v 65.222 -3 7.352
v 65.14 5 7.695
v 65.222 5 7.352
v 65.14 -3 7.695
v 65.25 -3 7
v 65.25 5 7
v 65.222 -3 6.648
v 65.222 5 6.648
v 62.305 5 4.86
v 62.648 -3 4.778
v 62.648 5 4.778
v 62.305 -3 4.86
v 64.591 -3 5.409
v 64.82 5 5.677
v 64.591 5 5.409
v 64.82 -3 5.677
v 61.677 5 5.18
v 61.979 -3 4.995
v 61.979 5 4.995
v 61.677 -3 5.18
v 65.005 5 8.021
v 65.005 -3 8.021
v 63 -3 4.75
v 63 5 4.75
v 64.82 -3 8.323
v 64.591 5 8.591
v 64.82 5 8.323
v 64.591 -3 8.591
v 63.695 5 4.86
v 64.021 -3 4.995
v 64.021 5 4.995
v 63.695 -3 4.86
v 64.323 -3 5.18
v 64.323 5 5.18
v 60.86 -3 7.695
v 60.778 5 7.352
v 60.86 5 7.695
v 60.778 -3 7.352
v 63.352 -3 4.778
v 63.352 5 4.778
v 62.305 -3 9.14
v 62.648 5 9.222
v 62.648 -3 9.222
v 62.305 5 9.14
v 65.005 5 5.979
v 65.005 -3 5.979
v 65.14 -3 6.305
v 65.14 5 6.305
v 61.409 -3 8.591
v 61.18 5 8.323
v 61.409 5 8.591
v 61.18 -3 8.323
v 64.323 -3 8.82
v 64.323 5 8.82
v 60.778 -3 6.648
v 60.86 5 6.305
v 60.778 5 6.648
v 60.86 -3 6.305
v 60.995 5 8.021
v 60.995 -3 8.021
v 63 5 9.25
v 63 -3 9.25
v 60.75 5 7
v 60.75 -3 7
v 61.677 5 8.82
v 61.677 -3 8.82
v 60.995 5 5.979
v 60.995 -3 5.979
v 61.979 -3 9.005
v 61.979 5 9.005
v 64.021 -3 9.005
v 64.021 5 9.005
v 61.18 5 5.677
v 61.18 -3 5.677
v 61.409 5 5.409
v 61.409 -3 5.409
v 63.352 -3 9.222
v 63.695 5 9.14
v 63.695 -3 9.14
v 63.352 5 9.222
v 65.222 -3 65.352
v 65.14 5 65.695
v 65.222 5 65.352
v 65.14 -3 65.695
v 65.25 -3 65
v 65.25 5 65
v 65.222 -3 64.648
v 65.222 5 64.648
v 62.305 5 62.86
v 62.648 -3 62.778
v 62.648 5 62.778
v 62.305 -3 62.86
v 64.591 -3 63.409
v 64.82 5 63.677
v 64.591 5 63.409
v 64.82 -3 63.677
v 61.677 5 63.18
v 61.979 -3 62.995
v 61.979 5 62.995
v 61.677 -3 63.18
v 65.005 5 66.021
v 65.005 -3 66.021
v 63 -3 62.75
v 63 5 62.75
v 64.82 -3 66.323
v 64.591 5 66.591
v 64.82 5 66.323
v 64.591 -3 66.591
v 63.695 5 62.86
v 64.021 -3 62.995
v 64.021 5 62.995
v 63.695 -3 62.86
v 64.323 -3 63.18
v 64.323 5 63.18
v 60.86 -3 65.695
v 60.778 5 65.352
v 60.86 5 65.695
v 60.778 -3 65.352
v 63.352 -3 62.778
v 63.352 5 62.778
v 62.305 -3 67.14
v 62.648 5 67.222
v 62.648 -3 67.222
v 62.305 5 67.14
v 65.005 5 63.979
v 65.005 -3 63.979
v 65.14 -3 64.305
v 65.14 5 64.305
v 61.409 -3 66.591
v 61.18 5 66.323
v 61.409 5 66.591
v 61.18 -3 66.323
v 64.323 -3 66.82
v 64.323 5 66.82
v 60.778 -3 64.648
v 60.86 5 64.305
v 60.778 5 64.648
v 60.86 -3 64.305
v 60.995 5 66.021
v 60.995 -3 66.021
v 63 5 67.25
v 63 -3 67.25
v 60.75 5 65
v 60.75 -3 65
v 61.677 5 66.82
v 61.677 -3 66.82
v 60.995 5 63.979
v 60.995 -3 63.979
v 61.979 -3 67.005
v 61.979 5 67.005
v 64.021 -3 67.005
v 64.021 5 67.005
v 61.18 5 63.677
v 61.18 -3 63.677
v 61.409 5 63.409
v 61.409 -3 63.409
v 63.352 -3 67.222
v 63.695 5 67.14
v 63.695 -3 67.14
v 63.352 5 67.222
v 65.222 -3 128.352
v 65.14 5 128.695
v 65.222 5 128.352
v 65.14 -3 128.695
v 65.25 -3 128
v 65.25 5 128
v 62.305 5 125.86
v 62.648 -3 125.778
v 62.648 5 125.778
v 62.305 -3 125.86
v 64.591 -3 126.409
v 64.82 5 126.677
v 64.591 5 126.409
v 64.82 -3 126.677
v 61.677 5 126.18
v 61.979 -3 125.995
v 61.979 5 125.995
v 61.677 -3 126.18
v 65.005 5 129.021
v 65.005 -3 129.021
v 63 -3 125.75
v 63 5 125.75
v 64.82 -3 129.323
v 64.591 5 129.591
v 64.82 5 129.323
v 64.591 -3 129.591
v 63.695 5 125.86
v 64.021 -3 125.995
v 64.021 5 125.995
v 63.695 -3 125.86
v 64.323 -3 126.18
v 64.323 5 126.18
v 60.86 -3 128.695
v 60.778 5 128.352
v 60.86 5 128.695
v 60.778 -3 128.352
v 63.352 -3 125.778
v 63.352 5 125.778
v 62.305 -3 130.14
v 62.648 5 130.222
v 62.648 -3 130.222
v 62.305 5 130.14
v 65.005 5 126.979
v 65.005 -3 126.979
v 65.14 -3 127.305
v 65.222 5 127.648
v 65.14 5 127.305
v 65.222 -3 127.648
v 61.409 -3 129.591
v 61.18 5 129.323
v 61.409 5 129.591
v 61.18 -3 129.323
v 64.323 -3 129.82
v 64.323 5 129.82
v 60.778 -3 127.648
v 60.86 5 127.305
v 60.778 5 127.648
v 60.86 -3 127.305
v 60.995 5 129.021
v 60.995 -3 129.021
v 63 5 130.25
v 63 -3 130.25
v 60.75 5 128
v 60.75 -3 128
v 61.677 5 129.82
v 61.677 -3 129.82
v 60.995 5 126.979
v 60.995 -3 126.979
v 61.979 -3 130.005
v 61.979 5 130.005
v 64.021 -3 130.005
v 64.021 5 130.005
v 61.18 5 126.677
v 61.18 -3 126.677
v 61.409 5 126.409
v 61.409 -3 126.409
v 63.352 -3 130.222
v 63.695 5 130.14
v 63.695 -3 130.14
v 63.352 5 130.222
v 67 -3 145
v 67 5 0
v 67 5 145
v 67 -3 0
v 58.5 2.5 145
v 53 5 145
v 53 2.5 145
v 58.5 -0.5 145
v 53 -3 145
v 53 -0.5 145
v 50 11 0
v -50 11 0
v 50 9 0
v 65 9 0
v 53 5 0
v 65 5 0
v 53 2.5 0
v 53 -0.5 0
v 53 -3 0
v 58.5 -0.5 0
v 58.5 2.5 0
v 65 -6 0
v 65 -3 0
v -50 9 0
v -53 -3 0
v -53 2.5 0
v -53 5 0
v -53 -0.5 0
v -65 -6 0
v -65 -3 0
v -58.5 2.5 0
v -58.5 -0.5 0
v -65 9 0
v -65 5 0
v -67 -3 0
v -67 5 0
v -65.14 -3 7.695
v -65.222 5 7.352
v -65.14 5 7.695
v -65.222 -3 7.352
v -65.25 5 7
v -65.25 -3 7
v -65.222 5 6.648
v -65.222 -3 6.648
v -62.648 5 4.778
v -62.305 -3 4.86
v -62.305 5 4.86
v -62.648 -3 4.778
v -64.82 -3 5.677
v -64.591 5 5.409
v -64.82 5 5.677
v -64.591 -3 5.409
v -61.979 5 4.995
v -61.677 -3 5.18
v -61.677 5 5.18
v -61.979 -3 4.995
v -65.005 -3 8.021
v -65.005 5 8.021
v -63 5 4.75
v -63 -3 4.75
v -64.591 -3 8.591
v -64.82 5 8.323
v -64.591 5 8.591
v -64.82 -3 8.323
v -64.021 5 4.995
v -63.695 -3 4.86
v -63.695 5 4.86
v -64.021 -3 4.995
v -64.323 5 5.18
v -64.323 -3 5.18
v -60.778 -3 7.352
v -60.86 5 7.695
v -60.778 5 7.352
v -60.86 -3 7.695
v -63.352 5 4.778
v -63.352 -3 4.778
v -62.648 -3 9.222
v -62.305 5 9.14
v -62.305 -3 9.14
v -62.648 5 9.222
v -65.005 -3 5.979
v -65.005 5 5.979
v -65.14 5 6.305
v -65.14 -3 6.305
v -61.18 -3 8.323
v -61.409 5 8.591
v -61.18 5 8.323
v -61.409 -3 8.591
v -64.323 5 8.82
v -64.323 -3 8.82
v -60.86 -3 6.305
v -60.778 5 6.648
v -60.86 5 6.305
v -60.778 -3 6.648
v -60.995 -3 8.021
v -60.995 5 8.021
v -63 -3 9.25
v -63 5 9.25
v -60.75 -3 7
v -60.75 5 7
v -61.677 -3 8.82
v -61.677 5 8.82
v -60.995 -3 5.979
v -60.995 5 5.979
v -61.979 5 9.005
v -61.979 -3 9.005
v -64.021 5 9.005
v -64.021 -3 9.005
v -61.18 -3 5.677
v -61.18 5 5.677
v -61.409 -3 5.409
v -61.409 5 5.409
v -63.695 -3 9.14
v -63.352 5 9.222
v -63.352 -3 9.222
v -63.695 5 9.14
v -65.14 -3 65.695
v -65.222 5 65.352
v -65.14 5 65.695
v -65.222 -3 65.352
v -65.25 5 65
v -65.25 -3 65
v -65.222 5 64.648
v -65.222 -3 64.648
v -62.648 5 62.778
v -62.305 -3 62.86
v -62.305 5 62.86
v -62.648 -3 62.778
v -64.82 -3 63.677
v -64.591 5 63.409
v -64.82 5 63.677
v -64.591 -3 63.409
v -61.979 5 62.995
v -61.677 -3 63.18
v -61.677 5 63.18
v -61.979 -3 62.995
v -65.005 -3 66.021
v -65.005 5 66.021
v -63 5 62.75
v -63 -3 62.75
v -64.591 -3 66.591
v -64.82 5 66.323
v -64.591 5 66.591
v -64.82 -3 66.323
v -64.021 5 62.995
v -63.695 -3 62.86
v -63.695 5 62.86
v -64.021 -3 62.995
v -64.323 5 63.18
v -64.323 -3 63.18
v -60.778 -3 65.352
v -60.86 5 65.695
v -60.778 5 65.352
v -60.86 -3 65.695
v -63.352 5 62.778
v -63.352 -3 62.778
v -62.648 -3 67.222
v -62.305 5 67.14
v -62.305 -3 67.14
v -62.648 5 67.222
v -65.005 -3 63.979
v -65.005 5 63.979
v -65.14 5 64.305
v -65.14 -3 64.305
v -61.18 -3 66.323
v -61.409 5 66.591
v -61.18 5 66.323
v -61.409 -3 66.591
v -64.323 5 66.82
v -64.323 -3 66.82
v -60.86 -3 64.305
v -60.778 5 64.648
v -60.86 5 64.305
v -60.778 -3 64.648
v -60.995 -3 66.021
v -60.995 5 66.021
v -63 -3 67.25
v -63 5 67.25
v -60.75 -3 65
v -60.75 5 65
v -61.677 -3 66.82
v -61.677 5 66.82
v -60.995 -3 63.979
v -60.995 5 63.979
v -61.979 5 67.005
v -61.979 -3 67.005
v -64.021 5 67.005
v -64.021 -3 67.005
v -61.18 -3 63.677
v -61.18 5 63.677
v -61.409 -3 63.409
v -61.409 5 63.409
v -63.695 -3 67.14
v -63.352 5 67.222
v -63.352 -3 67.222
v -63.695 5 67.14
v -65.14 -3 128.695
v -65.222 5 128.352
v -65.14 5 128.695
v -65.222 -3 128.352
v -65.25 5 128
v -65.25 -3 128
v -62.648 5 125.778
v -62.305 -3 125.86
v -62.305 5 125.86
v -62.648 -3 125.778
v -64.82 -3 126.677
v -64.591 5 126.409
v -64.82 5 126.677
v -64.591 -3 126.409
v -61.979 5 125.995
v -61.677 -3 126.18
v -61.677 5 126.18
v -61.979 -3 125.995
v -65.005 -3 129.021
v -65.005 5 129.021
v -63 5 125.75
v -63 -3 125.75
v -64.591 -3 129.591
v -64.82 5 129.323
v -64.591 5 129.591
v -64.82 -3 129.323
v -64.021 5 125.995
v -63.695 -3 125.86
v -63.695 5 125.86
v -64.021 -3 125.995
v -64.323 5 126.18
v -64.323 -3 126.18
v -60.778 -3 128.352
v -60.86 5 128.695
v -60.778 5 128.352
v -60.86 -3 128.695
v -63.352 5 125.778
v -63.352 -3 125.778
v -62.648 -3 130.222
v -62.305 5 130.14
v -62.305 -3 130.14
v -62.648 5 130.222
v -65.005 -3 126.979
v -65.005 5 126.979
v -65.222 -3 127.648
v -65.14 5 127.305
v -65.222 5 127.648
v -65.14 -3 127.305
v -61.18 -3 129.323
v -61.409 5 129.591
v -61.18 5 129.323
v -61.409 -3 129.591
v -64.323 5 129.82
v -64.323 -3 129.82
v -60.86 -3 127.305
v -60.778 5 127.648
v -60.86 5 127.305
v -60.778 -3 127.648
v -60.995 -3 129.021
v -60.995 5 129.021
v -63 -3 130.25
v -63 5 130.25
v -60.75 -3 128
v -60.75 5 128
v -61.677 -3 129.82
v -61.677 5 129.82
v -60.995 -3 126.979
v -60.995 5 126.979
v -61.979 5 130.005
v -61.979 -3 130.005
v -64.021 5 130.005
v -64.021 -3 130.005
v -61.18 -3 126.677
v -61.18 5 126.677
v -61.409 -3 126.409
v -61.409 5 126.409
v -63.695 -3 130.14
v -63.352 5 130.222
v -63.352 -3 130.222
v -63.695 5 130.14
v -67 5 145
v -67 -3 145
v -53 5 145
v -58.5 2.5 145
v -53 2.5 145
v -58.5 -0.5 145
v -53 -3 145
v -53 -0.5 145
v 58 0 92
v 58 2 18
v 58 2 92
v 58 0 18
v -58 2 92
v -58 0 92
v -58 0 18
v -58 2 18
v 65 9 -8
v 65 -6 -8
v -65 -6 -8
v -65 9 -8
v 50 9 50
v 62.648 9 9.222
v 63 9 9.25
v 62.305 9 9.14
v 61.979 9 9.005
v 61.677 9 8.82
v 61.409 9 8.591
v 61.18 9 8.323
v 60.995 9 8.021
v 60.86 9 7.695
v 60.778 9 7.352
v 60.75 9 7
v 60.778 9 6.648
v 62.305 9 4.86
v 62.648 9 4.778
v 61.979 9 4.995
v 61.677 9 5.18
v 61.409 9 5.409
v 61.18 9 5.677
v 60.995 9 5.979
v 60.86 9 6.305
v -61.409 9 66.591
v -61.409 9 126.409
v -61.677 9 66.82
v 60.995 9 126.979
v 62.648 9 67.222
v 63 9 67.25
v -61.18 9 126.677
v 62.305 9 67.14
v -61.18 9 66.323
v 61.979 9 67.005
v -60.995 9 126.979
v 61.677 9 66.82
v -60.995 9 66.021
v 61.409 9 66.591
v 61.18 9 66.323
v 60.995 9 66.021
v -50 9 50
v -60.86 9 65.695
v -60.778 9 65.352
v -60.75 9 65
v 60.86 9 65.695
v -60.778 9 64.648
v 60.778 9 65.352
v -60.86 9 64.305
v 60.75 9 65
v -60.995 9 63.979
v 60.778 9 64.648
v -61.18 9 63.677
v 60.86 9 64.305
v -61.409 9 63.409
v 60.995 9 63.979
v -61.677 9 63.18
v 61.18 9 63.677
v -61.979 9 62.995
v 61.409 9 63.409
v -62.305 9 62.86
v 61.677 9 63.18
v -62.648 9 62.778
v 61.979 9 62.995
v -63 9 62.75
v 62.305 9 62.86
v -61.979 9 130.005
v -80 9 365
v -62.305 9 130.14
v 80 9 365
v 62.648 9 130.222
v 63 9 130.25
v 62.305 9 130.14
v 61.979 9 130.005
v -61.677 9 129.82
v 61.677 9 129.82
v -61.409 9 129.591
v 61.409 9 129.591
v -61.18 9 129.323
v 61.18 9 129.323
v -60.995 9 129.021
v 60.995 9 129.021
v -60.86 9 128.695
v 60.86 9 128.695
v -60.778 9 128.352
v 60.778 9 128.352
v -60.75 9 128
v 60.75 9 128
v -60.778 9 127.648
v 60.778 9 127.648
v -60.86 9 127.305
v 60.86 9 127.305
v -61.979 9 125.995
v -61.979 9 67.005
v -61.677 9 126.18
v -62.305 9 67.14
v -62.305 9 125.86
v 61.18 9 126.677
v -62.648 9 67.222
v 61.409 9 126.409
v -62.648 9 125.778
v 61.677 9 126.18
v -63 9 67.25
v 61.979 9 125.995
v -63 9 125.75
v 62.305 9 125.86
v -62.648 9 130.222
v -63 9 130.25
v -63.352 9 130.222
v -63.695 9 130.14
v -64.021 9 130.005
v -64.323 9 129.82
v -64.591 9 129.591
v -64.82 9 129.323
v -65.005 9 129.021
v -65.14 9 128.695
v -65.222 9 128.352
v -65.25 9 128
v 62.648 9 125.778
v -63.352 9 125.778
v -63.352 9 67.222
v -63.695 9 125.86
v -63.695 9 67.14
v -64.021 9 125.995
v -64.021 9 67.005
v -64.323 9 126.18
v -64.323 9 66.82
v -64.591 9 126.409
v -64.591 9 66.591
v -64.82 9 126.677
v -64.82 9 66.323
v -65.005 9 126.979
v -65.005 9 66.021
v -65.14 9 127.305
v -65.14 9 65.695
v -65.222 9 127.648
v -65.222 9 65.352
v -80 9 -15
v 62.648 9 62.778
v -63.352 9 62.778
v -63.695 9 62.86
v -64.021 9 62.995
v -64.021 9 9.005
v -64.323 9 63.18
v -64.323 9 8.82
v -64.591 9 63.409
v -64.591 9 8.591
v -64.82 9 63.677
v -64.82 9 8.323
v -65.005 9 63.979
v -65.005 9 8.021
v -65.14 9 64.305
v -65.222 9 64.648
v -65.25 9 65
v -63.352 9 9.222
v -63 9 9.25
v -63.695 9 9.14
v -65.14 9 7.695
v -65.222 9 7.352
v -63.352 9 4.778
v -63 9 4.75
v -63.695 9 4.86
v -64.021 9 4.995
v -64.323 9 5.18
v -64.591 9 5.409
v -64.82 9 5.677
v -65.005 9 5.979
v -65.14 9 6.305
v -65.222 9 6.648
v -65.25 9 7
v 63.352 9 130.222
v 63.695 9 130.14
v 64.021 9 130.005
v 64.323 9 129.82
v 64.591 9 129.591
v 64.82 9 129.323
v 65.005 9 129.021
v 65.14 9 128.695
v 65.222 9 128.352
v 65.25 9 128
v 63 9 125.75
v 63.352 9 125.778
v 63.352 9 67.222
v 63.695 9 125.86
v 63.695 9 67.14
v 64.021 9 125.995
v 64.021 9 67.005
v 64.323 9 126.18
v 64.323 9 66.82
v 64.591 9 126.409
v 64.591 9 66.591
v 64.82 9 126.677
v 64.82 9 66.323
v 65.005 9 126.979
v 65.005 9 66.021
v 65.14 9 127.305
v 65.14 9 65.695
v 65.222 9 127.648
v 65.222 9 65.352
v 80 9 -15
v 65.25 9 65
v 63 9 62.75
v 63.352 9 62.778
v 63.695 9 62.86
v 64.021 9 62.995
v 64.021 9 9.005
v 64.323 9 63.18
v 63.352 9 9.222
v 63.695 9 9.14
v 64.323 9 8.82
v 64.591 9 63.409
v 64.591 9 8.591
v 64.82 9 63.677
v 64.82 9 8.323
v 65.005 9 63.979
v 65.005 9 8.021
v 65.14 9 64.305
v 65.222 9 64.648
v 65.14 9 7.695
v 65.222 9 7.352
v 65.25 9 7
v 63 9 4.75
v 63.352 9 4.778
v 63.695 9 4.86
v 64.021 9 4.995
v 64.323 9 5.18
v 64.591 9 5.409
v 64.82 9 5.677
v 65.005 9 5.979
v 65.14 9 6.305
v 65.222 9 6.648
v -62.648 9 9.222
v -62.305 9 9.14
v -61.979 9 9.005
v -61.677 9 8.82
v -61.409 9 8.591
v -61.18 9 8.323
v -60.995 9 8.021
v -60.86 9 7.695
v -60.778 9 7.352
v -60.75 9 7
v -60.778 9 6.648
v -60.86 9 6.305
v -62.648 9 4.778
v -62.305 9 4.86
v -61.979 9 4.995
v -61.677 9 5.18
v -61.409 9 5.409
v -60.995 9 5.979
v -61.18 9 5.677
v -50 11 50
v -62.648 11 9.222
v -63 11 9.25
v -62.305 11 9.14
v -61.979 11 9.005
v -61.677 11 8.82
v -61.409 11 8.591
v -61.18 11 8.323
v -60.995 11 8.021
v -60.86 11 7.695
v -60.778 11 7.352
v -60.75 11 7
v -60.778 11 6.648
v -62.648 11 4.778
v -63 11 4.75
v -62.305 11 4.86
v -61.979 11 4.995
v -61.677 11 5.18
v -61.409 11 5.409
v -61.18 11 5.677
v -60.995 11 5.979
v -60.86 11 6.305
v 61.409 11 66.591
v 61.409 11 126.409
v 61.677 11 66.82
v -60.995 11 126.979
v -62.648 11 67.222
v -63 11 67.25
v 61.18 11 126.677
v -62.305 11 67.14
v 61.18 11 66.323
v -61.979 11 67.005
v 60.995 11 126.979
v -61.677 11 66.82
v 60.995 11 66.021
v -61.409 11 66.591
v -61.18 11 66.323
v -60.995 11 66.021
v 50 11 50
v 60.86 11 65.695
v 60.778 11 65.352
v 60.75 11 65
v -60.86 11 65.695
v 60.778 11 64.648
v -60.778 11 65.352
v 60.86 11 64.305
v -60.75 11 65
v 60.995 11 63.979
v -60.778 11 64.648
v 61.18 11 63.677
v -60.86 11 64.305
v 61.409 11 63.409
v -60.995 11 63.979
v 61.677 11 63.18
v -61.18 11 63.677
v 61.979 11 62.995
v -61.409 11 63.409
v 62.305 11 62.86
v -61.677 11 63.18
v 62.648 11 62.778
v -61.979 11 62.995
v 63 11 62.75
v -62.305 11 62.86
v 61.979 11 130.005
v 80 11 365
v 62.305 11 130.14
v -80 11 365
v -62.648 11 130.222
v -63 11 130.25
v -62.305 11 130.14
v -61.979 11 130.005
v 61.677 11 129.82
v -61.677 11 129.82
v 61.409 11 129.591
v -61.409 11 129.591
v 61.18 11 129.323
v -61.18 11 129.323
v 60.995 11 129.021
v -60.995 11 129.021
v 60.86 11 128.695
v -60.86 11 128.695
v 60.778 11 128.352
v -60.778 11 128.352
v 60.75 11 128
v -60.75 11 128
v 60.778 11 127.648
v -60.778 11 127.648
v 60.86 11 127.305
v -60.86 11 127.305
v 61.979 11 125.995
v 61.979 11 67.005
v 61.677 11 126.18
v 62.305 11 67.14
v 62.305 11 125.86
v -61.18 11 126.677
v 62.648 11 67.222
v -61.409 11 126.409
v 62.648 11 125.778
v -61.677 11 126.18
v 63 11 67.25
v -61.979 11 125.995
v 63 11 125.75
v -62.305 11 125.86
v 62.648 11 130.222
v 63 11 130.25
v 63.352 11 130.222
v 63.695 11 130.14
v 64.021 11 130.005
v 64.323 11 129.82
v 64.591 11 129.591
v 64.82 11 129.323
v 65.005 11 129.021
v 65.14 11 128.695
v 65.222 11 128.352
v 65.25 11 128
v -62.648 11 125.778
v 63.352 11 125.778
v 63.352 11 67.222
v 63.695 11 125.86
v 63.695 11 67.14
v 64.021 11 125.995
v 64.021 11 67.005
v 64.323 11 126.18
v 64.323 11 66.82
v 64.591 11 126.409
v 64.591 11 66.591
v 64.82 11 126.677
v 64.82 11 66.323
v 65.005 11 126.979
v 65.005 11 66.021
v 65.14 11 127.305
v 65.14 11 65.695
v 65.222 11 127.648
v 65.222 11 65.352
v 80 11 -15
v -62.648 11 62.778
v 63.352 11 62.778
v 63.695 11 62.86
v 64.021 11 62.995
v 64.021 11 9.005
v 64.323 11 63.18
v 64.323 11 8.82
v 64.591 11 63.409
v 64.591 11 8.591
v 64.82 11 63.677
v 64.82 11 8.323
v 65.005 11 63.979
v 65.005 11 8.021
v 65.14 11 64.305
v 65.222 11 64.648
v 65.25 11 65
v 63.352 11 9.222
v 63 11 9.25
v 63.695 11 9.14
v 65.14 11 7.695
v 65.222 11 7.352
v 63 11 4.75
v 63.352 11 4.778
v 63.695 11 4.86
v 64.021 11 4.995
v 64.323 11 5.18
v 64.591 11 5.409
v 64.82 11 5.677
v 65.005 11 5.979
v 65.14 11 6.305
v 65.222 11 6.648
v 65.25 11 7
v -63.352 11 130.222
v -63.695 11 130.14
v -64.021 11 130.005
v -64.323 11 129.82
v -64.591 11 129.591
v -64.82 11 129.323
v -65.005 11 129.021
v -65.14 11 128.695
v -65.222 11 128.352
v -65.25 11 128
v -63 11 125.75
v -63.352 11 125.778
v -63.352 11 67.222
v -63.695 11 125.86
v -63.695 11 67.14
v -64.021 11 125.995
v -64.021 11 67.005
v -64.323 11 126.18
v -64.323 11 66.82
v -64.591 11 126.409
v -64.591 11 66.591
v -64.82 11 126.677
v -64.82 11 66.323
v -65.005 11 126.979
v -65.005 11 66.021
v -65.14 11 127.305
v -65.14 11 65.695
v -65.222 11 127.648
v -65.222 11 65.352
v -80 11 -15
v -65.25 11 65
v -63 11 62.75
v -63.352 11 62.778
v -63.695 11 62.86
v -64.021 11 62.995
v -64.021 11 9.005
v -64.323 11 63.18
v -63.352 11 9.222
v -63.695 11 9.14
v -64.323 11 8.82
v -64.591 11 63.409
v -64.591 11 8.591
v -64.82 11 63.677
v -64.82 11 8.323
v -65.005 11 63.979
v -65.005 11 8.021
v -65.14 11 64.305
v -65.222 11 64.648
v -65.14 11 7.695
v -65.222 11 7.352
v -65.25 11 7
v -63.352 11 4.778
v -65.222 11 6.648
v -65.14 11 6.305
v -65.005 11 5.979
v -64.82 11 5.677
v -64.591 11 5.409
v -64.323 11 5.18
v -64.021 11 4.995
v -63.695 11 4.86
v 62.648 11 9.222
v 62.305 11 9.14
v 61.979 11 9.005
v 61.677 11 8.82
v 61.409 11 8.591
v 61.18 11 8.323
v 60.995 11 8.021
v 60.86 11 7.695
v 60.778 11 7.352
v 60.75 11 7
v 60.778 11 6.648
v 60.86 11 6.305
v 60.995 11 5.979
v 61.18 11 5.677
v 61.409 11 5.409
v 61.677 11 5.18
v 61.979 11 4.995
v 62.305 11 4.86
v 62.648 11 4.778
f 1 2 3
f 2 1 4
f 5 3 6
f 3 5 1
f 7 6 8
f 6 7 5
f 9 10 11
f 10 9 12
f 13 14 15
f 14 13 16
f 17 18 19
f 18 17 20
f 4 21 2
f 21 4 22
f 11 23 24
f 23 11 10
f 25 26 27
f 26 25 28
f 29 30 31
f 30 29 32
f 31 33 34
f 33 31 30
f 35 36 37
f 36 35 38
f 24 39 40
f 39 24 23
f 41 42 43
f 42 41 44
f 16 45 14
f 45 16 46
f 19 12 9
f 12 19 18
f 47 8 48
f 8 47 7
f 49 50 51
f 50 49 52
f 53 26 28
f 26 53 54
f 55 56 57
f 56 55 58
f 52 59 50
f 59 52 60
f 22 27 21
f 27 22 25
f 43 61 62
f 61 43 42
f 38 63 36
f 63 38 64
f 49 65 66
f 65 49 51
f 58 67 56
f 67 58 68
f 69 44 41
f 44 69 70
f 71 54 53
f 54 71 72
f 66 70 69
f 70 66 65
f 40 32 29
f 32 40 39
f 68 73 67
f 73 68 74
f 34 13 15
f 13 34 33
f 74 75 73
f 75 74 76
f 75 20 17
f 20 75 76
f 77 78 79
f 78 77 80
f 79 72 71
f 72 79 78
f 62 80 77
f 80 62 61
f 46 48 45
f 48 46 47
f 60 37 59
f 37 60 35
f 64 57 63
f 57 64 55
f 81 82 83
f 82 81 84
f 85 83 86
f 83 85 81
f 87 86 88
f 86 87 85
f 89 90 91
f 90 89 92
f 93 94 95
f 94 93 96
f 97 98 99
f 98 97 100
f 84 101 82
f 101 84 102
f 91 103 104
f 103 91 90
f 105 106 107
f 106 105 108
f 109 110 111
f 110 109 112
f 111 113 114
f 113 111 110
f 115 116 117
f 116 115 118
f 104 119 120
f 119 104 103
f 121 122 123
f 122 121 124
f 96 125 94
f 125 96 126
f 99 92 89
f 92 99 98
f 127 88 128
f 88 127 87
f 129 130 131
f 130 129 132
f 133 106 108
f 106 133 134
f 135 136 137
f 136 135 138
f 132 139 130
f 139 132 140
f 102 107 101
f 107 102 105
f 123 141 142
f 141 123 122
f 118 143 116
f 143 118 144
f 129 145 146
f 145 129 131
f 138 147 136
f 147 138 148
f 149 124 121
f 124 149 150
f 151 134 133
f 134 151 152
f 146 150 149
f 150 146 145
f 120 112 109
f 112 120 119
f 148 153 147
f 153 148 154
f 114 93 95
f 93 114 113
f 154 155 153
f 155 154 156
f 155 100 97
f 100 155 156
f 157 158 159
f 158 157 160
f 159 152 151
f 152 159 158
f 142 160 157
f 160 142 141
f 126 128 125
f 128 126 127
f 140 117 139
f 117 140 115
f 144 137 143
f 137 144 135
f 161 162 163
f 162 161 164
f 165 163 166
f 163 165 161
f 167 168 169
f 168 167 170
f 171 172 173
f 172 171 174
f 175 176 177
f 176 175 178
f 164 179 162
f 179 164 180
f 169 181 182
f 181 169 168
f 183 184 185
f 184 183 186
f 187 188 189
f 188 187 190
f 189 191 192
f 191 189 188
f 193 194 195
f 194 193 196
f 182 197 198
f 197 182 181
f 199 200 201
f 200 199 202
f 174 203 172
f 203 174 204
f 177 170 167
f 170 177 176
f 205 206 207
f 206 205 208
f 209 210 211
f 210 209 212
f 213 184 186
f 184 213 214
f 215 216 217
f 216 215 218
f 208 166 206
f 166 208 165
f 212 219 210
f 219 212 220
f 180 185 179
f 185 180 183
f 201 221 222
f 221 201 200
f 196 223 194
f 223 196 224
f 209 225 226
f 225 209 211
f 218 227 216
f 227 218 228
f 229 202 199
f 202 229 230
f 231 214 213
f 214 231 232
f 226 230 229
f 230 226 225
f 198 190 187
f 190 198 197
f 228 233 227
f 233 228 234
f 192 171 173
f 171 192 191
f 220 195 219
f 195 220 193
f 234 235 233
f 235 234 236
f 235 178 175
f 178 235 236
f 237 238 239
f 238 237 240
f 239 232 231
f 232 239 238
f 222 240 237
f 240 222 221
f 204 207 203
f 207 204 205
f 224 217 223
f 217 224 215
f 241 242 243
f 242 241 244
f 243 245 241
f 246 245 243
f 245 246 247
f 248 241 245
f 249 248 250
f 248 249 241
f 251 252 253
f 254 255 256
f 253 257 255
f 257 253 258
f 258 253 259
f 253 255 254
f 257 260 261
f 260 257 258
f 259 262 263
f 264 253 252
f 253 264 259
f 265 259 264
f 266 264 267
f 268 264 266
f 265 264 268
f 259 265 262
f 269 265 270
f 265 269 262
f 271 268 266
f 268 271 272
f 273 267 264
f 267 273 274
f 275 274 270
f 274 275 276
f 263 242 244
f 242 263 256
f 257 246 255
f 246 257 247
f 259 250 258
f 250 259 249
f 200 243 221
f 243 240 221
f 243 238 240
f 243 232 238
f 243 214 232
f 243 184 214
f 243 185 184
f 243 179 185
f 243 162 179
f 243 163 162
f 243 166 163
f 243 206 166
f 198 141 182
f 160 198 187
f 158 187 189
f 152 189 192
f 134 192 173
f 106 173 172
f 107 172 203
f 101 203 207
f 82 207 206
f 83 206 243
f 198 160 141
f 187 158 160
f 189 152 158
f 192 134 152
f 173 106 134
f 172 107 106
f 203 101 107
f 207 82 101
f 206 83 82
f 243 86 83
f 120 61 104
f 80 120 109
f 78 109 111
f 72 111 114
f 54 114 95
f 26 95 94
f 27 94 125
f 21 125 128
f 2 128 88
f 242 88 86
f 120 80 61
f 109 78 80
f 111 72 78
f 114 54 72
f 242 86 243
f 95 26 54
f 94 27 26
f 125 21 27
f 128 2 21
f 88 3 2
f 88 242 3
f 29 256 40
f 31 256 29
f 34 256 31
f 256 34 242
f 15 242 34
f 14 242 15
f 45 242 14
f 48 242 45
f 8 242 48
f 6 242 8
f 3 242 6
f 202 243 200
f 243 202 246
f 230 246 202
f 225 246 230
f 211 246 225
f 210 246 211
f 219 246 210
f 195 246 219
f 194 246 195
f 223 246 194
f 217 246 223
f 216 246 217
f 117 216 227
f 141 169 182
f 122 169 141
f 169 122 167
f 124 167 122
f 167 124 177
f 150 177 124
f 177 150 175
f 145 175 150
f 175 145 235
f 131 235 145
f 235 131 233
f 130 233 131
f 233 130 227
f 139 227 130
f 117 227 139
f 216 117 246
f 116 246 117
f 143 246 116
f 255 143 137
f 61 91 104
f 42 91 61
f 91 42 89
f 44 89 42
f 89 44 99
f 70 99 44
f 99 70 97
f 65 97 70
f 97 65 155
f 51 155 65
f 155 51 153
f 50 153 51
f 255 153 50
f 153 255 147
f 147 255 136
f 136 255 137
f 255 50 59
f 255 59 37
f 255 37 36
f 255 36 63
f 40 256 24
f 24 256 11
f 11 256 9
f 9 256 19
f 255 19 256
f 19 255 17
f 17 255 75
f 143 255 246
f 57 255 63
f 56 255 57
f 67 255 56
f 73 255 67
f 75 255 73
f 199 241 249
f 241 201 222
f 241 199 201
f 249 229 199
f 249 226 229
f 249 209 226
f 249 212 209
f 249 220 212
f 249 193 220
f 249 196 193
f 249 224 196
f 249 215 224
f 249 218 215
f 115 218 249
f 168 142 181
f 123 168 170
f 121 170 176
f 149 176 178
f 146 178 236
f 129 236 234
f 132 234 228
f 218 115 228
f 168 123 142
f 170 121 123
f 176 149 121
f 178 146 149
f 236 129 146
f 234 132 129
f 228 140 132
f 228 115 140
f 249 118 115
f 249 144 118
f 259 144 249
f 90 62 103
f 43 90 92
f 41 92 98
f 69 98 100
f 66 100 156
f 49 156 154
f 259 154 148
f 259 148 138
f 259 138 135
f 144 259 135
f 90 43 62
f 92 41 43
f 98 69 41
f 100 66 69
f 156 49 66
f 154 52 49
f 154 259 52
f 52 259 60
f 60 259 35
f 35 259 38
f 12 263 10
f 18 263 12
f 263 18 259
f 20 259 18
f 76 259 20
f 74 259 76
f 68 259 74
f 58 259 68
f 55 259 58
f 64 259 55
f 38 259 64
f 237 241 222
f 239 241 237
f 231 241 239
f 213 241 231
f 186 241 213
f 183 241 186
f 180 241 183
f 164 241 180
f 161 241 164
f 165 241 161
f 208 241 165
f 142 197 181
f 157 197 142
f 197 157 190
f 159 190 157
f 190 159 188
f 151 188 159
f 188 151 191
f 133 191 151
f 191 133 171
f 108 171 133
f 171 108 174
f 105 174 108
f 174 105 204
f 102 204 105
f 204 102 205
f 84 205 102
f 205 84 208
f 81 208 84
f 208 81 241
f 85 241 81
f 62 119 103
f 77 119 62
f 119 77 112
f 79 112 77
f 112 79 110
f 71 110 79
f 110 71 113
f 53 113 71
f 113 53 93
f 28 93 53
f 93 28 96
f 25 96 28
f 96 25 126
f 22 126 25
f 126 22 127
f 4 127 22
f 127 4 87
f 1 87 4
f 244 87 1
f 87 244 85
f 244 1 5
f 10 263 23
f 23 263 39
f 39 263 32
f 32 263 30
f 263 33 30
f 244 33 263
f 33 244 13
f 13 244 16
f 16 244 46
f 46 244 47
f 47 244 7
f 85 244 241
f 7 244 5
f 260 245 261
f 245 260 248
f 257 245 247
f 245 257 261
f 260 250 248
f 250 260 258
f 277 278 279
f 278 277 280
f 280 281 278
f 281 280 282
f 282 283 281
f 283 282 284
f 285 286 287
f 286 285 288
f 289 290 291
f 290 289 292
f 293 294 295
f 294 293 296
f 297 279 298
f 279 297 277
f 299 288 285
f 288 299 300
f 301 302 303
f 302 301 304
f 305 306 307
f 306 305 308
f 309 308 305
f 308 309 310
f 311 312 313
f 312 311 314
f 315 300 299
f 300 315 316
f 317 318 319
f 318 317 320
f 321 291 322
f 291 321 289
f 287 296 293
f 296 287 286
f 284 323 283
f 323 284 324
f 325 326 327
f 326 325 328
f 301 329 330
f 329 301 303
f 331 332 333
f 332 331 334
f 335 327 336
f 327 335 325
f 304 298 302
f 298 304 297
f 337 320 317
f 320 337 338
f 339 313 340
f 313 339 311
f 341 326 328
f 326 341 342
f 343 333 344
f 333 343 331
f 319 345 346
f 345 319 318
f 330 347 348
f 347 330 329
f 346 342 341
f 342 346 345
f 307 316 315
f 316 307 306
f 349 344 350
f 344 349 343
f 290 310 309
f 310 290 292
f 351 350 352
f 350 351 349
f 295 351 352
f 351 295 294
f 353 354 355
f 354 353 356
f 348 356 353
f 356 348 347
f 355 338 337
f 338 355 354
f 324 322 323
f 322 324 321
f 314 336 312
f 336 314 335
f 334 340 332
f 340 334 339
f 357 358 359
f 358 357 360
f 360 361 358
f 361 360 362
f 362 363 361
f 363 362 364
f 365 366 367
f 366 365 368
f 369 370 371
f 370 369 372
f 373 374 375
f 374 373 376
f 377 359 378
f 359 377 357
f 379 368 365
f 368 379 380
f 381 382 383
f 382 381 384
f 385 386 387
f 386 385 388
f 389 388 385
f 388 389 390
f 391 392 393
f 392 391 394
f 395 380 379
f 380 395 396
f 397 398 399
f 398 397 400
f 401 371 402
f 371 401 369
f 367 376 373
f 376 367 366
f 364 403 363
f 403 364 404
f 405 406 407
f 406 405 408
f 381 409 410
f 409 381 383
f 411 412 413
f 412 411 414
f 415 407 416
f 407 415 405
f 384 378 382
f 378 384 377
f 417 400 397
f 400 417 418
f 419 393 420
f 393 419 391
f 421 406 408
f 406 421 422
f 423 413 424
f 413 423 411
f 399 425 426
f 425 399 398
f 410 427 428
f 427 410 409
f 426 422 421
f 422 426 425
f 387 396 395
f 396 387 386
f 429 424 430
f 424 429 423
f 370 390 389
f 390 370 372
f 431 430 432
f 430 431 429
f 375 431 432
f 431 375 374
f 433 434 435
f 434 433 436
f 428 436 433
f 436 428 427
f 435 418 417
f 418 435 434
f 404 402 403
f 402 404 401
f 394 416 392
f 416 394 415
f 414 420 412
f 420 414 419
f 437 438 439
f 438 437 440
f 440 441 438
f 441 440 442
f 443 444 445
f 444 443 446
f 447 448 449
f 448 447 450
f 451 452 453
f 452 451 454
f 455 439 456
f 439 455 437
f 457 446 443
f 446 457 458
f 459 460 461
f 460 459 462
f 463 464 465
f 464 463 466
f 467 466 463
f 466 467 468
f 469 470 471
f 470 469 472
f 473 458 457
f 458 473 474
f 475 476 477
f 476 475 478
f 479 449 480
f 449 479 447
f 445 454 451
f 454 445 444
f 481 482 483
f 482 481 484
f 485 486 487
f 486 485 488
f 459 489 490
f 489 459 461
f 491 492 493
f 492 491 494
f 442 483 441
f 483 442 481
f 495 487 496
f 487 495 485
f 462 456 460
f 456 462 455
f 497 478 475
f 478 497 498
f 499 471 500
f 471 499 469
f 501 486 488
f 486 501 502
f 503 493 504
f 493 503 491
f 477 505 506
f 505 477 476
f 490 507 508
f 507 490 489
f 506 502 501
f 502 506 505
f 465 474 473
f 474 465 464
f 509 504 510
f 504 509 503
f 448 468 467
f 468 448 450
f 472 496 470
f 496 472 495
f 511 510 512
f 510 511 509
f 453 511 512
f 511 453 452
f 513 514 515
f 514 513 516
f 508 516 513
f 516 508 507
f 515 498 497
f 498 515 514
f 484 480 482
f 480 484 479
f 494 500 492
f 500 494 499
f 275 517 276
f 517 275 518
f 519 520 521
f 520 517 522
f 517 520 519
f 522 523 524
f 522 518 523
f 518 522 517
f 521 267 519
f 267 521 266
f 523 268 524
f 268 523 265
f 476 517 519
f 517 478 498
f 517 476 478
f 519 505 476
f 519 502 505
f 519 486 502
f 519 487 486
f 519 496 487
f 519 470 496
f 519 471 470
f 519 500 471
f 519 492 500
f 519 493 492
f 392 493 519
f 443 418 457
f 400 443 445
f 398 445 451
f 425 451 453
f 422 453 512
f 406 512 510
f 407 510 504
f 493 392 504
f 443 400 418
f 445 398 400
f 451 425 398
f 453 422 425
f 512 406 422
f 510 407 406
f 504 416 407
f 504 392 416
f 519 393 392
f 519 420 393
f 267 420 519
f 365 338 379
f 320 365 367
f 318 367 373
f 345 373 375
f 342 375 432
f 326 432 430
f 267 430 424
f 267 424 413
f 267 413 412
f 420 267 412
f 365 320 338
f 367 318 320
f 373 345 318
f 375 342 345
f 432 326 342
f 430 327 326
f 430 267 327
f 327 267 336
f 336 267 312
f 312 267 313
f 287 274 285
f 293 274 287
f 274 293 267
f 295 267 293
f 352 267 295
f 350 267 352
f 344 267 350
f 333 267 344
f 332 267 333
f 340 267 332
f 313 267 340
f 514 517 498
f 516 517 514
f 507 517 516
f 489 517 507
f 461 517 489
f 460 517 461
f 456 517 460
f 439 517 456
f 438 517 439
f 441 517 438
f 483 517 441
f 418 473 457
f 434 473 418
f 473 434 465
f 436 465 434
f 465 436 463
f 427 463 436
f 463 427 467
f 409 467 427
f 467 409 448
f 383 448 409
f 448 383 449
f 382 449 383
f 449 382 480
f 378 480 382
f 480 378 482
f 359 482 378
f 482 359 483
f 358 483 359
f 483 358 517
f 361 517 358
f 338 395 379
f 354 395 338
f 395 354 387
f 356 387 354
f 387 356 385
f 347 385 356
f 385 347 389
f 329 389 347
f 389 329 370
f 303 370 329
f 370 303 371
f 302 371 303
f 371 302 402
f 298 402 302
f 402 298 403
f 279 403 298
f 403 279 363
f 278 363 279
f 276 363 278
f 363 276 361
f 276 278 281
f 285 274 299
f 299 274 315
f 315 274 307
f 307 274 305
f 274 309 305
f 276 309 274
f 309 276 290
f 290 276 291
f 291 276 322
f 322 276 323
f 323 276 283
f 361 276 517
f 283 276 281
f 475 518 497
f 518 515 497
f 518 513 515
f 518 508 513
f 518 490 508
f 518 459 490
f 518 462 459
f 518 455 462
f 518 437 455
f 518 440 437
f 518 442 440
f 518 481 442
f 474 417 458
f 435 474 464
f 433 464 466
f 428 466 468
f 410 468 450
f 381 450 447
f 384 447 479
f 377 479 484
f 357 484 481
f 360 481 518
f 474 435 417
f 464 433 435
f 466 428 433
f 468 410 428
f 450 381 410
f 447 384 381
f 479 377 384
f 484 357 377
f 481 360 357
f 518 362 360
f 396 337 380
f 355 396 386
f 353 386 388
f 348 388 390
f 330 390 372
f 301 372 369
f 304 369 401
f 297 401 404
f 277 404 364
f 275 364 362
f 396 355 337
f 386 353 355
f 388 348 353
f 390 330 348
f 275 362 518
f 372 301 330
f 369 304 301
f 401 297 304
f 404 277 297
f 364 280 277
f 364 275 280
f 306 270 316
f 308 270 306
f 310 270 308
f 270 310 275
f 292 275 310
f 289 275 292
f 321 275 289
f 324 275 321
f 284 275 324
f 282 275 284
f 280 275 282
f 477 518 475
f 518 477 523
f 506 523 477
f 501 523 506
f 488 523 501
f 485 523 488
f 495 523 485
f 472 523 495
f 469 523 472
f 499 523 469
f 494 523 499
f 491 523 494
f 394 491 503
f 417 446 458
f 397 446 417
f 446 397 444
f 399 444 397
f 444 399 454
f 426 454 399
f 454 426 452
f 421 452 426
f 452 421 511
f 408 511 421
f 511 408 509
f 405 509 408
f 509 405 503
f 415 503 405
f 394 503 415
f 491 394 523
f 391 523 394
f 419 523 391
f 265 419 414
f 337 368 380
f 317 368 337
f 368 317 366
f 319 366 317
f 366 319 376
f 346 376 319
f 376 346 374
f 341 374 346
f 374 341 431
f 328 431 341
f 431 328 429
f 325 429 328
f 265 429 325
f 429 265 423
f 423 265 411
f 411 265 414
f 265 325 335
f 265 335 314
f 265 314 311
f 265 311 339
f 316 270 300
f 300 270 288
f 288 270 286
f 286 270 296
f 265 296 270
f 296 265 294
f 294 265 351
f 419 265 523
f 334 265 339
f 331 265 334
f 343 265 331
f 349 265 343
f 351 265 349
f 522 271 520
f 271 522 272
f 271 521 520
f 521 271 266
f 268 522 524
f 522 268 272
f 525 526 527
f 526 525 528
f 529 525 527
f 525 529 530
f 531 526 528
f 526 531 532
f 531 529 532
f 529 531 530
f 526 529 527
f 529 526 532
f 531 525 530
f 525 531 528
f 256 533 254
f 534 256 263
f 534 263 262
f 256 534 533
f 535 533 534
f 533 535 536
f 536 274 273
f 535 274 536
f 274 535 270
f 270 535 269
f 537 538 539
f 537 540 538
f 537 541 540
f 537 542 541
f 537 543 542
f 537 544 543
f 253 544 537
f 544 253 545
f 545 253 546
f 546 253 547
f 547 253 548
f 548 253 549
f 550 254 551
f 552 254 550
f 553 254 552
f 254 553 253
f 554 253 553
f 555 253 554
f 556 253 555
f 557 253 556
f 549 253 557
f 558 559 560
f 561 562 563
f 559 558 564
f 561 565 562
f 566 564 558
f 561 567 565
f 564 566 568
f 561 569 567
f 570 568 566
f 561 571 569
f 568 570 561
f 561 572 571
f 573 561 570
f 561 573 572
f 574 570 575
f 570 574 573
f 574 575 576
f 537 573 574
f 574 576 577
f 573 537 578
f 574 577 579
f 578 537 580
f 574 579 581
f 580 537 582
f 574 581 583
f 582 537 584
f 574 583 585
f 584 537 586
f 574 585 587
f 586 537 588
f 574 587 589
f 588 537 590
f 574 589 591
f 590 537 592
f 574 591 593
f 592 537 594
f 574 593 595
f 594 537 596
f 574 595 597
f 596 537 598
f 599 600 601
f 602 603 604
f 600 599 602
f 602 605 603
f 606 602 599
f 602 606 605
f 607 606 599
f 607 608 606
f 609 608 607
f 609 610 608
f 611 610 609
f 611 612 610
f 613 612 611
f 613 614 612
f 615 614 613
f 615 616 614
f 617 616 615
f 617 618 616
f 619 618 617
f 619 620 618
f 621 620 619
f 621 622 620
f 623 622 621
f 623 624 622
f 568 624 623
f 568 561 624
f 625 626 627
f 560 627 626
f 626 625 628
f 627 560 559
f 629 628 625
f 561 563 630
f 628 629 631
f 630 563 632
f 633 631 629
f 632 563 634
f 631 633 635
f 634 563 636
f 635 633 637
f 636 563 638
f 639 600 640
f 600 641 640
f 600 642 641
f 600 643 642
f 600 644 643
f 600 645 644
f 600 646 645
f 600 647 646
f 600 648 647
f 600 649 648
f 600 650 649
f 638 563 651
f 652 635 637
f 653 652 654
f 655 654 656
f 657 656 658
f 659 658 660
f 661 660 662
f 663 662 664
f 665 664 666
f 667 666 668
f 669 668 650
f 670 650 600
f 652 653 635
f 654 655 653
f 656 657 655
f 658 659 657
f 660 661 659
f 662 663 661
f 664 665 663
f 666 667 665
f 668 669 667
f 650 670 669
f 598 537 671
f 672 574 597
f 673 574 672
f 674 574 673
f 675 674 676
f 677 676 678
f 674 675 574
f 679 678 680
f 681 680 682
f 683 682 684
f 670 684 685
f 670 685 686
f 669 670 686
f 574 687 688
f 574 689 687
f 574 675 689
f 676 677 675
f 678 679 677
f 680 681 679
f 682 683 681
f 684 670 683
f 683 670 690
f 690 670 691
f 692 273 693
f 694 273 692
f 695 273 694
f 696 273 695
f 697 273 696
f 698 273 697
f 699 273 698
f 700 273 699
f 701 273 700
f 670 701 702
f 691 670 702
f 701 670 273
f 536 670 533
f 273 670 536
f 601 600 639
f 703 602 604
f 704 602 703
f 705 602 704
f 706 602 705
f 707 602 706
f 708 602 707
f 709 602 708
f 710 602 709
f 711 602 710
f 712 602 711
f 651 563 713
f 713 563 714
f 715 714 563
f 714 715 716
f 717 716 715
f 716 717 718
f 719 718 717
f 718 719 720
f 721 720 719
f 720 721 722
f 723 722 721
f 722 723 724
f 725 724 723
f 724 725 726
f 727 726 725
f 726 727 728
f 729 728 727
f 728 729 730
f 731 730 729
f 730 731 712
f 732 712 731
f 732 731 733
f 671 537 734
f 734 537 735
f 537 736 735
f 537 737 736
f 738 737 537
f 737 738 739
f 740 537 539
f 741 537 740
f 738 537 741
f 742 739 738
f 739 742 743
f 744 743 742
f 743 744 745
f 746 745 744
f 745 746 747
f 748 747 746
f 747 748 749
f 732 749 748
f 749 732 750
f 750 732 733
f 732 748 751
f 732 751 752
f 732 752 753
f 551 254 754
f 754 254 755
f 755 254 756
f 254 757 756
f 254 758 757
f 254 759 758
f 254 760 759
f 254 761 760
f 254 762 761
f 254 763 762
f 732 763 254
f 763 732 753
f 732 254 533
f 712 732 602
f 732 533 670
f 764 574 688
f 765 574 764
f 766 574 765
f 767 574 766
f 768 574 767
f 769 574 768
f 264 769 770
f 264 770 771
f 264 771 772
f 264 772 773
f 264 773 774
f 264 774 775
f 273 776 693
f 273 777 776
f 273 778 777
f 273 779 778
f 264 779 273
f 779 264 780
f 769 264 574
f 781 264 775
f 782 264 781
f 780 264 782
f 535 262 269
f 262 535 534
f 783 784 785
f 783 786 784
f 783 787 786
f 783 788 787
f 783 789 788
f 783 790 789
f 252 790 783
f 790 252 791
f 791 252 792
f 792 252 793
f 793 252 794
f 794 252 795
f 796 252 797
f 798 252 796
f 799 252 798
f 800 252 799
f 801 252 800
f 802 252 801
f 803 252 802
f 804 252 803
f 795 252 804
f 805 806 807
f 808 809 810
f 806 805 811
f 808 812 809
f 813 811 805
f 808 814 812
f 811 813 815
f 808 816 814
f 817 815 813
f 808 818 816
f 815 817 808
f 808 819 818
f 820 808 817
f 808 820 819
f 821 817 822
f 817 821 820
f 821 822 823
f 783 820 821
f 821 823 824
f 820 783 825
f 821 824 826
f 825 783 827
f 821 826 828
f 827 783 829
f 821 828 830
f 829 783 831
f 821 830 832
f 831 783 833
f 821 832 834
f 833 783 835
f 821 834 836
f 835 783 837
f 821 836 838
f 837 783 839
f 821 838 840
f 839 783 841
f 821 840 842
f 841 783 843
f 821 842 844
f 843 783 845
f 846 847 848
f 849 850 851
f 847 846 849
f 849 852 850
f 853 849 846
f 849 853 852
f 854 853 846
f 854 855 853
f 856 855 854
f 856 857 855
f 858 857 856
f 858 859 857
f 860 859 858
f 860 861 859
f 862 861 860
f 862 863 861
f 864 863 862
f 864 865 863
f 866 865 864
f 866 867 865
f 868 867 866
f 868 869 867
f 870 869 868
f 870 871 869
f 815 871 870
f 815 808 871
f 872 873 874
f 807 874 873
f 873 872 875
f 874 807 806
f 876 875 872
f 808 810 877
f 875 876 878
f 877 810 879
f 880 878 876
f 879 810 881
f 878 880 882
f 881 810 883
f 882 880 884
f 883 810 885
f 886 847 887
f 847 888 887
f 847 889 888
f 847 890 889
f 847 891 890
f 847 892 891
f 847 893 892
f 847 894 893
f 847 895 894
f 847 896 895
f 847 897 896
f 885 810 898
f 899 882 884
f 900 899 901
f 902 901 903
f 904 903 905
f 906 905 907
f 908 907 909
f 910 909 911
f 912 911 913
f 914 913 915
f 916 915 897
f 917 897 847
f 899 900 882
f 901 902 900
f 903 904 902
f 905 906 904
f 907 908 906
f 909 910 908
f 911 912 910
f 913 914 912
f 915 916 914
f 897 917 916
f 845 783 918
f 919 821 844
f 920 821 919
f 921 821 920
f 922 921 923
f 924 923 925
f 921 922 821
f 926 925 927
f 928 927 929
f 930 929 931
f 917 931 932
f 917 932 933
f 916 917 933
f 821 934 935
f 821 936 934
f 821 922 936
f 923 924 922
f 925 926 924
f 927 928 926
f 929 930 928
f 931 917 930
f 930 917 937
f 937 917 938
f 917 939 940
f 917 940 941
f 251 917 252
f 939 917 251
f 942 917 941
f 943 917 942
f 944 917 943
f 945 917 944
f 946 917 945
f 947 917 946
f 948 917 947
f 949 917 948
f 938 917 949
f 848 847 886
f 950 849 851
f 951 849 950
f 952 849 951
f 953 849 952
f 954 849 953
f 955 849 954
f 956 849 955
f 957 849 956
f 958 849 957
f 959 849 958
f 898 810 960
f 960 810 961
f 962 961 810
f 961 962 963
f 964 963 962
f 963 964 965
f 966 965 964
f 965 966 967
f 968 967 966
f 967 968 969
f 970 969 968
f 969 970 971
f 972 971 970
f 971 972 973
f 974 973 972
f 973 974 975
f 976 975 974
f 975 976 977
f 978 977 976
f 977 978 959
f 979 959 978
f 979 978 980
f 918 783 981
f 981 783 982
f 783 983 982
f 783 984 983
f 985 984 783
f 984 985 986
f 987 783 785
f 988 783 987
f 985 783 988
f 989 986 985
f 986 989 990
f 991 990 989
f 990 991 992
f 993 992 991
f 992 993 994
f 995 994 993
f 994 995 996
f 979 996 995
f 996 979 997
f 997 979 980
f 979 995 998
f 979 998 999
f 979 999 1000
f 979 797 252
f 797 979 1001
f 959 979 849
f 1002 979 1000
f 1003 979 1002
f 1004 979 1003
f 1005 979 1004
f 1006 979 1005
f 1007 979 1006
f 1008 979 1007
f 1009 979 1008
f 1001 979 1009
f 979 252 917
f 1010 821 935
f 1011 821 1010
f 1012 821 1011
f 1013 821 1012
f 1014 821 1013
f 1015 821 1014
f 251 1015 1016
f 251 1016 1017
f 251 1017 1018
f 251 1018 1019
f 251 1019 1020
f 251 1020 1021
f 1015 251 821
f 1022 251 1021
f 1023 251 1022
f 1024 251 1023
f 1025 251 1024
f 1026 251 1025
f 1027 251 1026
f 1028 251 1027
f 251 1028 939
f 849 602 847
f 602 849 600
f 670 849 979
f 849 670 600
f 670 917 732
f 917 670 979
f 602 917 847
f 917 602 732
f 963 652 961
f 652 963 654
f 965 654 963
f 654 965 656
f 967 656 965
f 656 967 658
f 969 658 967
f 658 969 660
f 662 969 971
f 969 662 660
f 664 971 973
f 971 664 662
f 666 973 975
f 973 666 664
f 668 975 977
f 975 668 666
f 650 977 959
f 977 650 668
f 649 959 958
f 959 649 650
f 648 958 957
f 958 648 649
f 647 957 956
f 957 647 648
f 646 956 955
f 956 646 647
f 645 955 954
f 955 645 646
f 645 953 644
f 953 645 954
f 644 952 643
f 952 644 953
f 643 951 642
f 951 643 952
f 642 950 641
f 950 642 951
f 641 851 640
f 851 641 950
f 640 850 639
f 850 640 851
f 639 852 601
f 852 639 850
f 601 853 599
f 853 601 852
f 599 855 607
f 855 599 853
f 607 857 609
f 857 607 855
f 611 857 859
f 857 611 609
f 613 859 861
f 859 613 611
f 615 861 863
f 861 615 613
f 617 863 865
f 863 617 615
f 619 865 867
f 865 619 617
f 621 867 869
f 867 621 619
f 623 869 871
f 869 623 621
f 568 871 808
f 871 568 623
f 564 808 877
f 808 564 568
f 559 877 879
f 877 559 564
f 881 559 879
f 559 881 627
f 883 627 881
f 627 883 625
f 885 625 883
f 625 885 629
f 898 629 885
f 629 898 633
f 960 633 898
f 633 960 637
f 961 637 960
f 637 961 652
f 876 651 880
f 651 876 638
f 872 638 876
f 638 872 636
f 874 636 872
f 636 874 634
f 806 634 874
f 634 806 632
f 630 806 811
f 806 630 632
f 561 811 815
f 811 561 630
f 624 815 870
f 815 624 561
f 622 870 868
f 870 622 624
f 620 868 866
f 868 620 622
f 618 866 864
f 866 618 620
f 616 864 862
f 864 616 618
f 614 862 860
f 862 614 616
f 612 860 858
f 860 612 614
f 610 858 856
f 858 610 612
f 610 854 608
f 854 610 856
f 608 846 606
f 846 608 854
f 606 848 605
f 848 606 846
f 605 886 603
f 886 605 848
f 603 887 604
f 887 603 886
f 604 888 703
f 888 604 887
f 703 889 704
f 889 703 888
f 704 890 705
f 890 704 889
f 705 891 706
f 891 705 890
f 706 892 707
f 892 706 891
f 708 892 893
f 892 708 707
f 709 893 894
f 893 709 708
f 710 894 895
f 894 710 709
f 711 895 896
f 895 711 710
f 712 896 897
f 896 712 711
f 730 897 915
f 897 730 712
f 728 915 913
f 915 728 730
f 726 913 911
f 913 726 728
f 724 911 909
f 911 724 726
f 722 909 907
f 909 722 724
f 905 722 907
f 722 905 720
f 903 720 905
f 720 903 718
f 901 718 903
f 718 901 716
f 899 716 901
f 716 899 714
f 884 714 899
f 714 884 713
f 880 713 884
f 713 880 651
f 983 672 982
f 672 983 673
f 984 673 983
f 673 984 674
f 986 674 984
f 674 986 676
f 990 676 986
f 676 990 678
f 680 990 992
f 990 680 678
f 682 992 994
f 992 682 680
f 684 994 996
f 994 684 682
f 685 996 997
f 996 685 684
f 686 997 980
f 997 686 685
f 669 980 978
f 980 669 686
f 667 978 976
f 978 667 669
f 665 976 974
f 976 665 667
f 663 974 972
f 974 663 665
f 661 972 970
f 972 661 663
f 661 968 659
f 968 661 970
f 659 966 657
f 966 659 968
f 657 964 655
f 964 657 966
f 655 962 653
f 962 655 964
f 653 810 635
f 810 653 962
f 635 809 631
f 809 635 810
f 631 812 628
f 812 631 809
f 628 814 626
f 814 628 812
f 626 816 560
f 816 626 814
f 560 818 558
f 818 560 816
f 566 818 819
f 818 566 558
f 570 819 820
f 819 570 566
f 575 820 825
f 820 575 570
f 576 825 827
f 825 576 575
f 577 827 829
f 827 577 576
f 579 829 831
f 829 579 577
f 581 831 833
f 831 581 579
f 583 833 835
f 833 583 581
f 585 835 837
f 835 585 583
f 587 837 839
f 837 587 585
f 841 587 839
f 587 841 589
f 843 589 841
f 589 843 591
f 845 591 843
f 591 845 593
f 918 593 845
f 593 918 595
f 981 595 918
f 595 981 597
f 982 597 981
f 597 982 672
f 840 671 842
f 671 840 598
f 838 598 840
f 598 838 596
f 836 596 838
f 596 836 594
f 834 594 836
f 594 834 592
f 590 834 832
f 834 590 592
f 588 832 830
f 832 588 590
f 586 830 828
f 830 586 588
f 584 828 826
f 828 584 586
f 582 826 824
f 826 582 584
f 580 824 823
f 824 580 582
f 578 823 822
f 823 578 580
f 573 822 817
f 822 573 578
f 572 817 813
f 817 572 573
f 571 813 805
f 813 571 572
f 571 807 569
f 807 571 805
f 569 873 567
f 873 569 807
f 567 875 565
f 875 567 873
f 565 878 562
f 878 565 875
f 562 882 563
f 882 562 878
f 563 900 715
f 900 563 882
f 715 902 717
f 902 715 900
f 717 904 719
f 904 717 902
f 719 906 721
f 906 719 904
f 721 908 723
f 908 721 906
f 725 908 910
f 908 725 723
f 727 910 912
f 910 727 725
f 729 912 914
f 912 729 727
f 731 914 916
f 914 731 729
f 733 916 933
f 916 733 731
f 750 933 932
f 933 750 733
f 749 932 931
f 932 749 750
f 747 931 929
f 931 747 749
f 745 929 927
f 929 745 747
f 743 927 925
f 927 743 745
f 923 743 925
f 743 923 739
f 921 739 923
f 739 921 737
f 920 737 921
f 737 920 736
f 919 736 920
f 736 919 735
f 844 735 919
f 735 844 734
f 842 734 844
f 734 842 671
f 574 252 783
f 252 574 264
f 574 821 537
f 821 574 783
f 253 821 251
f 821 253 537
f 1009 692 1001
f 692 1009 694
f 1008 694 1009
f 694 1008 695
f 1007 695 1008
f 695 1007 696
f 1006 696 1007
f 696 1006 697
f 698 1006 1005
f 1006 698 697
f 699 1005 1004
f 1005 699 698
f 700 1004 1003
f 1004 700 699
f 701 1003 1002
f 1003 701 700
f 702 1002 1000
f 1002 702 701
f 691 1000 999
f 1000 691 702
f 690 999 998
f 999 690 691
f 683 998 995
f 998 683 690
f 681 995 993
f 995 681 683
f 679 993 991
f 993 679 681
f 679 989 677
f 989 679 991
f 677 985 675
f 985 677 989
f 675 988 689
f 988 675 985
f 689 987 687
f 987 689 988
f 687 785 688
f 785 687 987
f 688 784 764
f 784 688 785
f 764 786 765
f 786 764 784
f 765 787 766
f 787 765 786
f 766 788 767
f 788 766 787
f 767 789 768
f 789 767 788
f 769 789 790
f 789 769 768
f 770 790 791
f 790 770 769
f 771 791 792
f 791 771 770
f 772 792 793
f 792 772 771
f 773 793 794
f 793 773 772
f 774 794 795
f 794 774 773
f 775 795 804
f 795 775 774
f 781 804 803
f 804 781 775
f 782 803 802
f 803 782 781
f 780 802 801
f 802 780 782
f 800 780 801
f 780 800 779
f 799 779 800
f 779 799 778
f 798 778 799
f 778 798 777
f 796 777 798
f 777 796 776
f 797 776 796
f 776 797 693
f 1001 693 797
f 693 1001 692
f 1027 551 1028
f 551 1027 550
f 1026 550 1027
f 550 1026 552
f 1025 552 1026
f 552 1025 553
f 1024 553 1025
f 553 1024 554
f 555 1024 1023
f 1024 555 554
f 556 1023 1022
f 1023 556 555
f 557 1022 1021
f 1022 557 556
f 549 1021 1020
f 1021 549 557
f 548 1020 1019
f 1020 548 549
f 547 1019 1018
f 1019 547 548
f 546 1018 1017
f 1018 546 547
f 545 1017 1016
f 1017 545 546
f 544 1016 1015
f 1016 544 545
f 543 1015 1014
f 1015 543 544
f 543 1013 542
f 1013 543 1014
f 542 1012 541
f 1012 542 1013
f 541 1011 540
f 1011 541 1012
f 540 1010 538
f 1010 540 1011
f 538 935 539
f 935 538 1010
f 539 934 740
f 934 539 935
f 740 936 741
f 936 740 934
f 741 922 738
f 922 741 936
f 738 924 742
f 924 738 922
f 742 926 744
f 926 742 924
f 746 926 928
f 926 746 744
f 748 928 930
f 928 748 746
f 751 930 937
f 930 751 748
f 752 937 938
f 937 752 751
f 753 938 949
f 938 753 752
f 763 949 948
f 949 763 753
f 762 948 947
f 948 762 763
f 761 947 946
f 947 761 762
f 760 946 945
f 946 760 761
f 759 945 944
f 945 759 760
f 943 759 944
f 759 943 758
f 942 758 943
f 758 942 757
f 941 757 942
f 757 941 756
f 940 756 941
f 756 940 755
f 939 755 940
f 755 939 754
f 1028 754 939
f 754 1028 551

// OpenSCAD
// Bench cartridge, millimetres. Origin at port centreline and sill elevation.
// Preview with F5. Select one part, render with F6, then export STL or DXF.
// Stock and drill templates only. Survey the purchased actuator for its pin fit.
part = "assembly"; // [assembly,leaf,guide_left,guide_right,sill,divider_template]
lift = 18; // [0:1:50]
$fn=40;
module leaf(){
    // Clevis mounts separately. Transfer-drill its hole pattern after alignment.
    translate([-58,0,0]) cube([116,2,74]);
}
module guide(left=true){
    // Mirrored channels. The inboard shoulders sit 117 mm apart.
    module blank(){
        difference(){
            translate([53,-3,0]) cube([14,8,145]);
            translate([52,-0.5,-1]) cube([6.5,3,147]);
            for(z=[7,65,128])
                translate([63,6,z]) rotate([90,0,0]) cylinder(d=4.5,h=10);
        }
    }
    if(left) mirror([1,0,0]) blank(); else blank();
}
module sill(){translate([-65,-6,-8]) cube([130,15,8]);}
module divider_template(){
    difference(){
        translate([-80,-15]) square([160,380]);
        translate([-50,0]) square([100,50]);
        for(x=[-63,63], z=[7,65,128]) translate([x,z]) circle(d=4.5);
    }
}
if(part=="leaf") leaf();
if(part=="guide_left") guide(true);
if(part=="guide_right") guide(false);
if(part=="sill") sill();
if(part=="divider_template") divider_template();
if(part=="assembly"){
    color("silver")translate([0,0,lift]) leaf();
    color("teal"){guide(true);guide(false);}
    color("dimgray") sill();
    color([.6,.8,.85,.35])translate([0,11,0])rotate([90,0,0])
        linear_extrude(2) divider_template();
}
